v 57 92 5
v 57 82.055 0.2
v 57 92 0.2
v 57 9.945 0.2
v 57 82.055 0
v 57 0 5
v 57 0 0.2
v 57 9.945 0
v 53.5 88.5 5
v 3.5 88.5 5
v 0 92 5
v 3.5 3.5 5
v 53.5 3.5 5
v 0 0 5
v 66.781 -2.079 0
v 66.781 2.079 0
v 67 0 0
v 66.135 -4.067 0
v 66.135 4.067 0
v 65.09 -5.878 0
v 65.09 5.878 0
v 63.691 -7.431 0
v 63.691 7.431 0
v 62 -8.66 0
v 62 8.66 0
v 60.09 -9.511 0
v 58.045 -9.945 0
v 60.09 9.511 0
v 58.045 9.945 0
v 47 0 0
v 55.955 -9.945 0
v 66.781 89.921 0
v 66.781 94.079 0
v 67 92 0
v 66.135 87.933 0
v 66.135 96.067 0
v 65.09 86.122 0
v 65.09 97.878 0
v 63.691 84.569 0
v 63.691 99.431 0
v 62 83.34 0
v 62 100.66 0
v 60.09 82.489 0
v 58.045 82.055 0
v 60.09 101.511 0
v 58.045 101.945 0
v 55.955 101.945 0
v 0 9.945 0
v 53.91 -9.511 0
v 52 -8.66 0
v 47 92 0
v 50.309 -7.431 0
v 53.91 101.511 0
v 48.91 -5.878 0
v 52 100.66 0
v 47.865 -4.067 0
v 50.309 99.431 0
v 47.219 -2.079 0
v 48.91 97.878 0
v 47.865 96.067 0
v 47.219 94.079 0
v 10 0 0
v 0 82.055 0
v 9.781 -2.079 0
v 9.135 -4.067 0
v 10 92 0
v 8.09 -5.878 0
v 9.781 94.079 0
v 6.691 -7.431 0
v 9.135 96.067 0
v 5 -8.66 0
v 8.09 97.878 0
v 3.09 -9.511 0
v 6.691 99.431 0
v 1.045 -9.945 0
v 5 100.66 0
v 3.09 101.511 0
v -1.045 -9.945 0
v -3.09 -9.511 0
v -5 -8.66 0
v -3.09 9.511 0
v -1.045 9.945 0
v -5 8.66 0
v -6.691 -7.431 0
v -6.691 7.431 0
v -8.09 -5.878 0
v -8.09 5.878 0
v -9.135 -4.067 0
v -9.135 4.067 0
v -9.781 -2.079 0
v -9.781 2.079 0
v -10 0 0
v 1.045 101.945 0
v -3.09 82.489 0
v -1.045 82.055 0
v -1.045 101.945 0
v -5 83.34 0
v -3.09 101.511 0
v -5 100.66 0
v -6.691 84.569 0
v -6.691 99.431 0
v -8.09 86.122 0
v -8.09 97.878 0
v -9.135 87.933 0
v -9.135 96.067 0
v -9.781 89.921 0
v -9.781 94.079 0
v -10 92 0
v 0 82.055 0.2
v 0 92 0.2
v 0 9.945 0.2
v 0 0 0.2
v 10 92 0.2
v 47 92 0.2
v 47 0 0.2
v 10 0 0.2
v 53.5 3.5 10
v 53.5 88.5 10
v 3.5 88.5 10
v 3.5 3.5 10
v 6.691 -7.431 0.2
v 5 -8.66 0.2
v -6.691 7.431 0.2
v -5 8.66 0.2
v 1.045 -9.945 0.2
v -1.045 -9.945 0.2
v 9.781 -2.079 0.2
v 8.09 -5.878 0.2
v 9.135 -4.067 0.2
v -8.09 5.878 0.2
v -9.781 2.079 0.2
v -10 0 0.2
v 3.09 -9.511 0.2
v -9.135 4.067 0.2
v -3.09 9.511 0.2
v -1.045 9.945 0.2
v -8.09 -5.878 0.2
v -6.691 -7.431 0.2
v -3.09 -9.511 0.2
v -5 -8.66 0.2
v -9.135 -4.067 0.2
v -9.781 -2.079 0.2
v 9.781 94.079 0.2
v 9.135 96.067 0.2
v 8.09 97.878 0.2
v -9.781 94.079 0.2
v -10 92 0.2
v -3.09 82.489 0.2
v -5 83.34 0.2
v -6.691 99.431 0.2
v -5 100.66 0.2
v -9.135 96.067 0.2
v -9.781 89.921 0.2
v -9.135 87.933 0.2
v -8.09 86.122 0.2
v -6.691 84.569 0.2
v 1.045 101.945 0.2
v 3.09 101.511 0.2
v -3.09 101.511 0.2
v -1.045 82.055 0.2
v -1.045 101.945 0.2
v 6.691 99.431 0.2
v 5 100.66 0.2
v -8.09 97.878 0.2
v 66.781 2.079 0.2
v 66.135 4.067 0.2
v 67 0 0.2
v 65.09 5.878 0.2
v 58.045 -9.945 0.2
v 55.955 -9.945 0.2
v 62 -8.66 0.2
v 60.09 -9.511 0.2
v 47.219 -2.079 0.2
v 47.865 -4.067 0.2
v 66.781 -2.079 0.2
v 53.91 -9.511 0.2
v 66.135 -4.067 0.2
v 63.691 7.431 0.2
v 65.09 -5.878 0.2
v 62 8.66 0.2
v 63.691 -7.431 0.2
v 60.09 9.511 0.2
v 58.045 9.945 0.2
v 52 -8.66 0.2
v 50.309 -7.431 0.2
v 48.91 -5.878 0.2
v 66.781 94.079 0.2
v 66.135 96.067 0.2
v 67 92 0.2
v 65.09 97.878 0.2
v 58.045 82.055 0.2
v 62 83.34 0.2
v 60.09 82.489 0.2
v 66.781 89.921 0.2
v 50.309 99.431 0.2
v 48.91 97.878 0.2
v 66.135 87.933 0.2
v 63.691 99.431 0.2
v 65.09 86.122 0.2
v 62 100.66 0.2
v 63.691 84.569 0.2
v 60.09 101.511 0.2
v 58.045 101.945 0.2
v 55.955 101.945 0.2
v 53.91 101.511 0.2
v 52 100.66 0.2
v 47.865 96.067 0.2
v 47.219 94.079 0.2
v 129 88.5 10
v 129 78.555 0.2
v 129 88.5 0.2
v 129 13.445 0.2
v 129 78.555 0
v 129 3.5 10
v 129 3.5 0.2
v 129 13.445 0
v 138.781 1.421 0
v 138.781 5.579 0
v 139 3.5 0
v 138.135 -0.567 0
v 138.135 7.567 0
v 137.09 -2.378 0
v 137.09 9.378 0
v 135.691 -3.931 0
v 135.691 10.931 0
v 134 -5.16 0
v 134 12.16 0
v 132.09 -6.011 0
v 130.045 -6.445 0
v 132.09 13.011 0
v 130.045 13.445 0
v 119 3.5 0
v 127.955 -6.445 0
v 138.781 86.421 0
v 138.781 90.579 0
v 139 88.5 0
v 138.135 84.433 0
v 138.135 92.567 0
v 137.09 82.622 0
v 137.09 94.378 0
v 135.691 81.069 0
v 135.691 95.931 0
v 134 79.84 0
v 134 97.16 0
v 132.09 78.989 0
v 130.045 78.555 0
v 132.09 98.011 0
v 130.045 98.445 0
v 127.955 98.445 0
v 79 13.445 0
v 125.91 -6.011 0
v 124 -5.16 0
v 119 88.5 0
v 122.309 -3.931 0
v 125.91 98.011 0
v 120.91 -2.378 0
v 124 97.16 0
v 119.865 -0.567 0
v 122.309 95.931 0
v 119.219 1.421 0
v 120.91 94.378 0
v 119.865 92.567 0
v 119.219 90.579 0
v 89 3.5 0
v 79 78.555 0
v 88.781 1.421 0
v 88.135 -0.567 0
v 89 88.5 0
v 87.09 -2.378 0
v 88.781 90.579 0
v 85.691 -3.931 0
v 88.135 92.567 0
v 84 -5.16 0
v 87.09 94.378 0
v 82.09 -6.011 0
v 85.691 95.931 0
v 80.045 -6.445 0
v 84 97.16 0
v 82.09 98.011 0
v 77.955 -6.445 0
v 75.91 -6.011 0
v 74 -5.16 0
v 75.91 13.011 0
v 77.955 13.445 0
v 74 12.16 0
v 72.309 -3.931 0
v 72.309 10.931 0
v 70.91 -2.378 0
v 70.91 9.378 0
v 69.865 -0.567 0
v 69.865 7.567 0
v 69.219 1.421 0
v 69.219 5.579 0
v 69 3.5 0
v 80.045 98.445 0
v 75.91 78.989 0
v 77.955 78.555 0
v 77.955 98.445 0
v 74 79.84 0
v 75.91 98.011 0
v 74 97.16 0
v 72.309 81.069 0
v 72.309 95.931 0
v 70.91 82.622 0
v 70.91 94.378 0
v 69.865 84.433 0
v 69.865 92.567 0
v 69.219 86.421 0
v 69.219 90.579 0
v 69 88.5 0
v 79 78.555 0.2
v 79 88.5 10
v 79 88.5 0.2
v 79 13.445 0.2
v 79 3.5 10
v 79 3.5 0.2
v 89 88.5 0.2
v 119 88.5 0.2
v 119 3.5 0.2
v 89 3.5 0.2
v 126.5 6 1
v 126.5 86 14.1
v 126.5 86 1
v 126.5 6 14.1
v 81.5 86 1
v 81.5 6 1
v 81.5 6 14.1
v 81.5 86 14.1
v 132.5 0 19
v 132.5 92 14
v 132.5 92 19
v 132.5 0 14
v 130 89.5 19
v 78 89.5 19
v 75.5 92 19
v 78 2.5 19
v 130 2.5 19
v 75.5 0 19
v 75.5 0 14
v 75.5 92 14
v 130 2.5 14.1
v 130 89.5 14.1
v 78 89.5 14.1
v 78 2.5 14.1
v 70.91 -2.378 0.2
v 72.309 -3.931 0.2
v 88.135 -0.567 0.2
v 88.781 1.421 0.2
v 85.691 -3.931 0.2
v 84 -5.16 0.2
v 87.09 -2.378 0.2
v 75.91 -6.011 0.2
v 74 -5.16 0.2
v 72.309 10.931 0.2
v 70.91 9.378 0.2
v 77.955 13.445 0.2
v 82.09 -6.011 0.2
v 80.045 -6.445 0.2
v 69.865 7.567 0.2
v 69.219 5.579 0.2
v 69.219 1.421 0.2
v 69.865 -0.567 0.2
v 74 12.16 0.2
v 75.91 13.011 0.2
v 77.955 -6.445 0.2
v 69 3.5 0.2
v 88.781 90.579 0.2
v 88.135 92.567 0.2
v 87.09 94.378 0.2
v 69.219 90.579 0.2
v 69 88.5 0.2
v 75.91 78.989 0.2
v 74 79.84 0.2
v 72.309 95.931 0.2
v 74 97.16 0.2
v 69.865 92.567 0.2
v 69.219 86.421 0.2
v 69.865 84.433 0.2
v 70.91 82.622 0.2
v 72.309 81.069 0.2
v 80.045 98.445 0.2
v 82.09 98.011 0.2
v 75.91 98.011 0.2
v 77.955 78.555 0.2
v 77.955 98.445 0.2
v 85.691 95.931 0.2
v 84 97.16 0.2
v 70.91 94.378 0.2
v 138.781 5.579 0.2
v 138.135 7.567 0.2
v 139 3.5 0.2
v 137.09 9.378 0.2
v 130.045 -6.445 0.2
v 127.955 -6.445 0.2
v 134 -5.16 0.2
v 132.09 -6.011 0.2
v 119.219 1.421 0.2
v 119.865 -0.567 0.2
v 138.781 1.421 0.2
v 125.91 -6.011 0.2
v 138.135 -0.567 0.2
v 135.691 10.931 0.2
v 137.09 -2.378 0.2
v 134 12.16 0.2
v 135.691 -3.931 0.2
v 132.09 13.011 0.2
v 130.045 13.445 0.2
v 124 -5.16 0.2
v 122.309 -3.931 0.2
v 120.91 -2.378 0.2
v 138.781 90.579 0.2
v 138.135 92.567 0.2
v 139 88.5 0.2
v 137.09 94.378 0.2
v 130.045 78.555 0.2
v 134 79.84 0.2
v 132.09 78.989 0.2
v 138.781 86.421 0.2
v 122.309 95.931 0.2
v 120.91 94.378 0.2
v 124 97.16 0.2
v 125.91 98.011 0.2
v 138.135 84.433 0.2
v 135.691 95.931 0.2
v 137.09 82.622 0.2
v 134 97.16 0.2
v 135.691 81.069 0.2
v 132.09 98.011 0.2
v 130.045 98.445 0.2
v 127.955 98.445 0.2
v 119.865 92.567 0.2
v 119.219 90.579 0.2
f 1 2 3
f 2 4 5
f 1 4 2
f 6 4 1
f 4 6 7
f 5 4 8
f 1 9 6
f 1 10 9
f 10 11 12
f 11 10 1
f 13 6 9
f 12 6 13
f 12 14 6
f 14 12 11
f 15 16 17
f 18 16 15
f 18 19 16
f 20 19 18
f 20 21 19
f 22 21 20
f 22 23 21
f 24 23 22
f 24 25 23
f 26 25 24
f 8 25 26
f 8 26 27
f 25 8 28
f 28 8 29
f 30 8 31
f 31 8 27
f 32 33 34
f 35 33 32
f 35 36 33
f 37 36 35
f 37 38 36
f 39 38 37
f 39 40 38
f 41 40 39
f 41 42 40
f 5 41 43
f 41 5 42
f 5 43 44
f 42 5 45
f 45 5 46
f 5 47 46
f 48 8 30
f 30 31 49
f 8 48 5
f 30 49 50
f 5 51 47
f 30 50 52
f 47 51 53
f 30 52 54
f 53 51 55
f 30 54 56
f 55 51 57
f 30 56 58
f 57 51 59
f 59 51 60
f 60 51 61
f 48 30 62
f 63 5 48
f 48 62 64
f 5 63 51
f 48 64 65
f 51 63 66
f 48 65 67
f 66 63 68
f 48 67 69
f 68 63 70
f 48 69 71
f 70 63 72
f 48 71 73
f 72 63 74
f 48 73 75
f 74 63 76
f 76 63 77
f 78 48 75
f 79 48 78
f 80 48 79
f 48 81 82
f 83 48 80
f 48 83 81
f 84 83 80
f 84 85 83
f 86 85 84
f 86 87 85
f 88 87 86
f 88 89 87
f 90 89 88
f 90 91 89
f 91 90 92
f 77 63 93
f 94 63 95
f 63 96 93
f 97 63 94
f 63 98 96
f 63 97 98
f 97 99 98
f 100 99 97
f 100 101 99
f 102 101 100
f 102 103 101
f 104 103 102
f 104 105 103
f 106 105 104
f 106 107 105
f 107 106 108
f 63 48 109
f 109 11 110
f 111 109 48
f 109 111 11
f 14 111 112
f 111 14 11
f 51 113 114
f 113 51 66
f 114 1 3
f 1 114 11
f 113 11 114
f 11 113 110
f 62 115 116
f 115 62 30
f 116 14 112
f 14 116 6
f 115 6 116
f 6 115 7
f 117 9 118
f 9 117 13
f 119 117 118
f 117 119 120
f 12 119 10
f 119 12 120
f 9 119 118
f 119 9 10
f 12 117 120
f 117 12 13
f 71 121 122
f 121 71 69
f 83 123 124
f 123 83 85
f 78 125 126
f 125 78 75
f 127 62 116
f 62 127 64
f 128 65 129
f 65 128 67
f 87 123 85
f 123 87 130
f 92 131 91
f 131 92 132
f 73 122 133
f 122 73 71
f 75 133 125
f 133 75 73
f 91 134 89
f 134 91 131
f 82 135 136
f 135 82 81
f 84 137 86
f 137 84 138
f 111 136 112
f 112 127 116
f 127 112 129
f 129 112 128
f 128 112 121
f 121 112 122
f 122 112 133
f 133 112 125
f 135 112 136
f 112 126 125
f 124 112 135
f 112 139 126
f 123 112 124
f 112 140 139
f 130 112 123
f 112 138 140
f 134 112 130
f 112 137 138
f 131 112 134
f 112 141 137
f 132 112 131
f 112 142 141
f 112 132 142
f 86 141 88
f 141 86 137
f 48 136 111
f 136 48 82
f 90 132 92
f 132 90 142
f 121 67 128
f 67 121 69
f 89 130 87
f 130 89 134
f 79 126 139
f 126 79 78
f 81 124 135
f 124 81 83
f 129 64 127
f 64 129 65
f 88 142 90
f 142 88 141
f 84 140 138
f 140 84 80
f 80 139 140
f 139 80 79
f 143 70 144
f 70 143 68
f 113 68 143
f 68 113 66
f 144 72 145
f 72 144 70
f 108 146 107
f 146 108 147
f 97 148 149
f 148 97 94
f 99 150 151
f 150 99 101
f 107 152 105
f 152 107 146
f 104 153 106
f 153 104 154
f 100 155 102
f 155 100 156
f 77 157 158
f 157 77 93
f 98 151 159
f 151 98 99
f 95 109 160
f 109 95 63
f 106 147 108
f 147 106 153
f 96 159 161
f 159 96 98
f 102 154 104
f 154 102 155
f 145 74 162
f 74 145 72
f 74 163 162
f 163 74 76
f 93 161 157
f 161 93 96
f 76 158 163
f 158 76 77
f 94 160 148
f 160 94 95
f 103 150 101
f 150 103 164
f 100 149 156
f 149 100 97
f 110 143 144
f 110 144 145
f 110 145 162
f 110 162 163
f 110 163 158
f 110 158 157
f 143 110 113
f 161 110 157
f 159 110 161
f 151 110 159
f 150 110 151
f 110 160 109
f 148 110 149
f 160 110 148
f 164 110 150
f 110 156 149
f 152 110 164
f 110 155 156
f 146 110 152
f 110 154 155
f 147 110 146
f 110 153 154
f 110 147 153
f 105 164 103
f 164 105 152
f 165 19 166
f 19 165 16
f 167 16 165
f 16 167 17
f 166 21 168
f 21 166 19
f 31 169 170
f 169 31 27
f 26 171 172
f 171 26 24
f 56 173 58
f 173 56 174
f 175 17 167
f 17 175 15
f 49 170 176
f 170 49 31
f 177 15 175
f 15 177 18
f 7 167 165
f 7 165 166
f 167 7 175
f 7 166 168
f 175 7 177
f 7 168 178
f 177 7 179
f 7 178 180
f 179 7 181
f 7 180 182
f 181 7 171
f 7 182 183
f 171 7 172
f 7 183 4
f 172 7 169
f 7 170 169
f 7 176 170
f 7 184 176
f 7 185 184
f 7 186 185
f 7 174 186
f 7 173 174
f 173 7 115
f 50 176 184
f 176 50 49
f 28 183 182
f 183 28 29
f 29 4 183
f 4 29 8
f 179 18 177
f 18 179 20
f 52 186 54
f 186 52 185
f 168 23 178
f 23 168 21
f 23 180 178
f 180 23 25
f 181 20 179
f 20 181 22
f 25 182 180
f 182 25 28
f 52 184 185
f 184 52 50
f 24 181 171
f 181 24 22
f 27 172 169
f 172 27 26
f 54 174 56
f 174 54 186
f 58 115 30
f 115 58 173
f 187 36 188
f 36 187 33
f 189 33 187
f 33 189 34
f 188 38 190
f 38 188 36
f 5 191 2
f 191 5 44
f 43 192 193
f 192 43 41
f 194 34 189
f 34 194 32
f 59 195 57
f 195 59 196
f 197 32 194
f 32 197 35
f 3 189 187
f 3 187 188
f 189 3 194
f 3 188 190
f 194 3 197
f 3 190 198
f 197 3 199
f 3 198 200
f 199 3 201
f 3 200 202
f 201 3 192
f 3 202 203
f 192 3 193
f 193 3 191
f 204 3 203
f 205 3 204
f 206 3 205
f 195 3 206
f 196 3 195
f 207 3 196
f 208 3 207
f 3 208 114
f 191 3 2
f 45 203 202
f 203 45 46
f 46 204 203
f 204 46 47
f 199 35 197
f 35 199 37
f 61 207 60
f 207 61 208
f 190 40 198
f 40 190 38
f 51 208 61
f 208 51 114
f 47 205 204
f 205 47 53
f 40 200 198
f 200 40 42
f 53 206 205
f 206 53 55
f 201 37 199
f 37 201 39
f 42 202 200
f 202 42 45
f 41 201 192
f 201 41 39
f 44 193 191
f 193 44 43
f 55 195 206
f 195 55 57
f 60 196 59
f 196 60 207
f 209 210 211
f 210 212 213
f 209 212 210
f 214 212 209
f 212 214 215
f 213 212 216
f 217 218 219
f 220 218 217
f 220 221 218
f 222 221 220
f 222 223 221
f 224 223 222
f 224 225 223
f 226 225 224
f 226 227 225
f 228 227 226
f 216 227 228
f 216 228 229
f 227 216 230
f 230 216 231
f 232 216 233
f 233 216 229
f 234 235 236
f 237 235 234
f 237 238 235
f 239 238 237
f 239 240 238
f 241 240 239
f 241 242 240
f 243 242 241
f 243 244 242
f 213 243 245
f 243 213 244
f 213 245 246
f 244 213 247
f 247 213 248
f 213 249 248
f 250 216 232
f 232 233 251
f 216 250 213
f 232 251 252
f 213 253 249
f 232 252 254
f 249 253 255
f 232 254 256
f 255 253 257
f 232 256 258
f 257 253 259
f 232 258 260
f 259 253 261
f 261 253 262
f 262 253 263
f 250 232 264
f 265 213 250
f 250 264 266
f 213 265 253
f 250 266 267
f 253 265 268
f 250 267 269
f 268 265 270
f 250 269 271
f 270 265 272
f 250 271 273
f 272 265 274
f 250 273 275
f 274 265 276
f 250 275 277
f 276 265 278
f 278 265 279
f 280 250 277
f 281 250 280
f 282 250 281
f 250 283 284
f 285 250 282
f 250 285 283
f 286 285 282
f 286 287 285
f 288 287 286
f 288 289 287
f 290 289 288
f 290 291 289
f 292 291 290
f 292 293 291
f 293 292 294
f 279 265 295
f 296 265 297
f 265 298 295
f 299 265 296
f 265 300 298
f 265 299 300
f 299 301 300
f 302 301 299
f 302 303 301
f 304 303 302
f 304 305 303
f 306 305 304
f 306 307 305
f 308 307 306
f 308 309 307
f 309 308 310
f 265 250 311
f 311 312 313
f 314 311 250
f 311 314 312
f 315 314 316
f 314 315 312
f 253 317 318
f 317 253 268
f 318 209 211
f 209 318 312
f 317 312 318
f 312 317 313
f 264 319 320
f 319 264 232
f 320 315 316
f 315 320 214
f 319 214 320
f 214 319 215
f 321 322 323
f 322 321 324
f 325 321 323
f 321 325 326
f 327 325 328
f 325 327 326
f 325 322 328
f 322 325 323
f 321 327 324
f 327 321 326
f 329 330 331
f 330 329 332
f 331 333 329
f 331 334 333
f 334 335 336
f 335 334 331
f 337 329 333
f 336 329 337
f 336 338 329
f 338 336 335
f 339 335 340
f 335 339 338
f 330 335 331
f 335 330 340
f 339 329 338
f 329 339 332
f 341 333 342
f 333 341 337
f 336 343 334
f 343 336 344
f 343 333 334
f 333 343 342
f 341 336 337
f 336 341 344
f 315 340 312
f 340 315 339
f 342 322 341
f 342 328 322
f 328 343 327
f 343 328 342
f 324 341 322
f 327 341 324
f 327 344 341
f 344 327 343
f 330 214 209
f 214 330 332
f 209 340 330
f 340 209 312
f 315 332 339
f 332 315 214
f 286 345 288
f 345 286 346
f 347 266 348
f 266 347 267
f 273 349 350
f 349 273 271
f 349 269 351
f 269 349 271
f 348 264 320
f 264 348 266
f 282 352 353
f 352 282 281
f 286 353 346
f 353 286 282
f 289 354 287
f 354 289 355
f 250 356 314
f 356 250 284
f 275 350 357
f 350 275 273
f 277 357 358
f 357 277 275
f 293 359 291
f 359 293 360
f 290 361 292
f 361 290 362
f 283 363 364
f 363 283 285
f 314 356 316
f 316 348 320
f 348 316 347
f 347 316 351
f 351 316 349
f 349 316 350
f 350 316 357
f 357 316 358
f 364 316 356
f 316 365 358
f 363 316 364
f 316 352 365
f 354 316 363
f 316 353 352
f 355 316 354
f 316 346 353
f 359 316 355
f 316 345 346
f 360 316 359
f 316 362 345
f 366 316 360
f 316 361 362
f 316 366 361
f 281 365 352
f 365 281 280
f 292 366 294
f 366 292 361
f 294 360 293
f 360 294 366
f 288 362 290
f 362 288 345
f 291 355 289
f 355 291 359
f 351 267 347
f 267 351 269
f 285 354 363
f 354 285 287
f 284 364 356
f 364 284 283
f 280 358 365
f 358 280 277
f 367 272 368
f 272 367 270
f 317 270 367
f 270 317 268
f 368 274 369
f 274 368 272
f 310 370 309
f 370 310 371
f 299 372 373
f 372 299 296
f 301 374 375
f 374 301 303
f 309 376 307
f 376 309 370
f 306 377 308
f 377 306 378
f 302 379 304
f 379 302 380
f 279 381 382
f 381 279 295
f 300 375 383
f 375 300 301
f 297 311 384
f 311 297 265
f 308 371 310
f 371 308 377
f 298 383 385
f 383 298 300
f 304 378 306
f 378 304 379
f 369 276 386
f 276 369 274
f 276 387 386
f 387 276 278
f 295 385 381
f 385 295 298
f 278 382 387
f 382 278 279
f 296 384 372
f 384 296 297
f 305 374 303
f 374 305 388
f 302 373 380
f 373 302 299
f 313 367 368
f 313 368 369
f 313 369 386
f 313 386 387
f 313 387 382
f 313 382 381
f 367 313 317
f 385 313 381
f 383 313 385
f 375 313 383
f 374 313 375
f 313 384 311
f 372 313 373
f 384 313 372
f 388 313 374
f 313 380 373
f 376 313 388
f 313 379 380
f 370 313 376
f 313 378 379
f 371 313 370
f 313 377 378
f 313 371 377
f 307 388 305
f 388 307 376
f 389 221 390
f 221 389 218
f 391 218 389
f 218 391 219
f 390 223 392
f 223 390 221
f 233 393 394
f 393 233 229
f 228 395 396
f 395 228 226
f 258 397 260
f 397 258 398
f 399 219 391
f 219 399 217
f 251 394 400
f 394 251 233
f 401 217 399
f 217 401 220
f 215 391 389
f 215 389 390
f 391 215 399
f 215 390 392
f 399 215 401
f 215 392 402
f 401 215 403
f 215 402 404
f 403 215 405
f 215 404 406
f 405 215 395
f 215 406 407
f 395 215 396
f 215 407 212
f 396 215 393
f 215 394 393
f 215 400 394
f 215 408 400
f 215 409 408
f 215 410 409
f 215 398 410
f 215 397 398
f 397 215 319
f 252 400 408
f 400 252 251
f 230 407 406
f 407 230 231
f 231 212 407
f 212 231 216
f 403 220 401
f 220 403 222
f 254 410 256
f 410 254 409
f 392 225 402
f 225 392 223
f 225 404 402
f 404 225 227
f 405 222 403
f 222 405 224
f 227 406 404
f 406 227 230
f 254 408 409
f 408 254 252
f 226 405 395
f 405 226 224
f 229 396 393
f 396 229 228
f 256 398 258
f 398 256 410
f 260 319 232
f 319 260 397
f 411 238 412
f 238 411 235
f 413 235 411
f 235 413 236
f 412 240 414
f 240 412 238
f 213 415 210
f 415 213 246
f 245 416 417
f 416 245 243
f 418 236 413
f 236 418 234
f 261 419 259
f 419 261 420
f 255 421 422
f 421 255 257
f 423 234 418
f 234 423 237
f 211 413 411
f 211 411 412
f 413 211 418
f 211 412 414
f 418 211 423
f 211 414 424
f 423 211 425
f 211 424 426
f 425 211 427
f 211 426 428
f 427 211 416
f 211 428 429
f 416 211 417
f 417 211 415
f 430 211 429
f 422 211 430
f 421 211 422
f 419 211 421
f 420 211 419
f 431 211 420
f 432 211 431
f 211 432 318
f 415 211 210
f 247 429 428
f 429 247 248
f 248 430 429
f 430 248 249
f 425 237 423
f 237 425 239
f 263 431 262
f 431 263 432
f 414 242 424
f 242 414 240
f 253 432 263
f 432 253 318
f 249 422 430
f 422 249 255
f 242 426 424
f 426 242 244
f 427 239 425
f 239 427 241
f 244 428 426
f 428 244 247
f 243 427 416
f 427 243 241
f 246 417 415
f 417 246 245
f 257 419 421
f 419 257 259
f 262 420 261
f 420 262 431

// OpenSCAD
// [FL_INDEX: keywords="openscad, 3d_parametric, Customizable_Stackable_Box, csg_solid" | COT="Parametric OpenSCAD design from 3DCodeverse"]
// Title: Customizable Stackable Box

// Display the Cover
display_cover = "yes"; // [yes,no]
// Display the box
display_box = "yes"; // [yes,no]
// Create ears at the corner
with_antiwarp_ears = "yes"; // [yes,no]


// the x length inside the box (the resulting x of the box is inner_x + 2*wall)
inner_x = 45;
// the y length inside the box
inner_y = 80;
// the z height inside the box, until the stacking frame begins
inner_z = 13;

// the z height of the stacking frame
stack_z = 5;
// per side gap between the box-bottom and the stacking frame (box bttom = inner_x + 2*wall; inner stackingframe x = inner_x + 2*wall + 2*stack_gap)
stack_gap = 1;

// wall thickness
wall = 2.5;
// bottom thickness
bottom = 1;

// start-height for overhang suport (should be >stack_z )
support_start_height = 10;

// height of the cover (the stacking part has the "stack_z"-height)
cover_height = 5;

// radius of the antiwarp ear
ear_radius = 10;
// height of the antiwarp ear, should be your layer-height for easy cutoff
ear_height = 0.2;


if(display_cover == "yes"){
	stackable_box_cover(inner_x,inner_y,stack_z,stack_gap,wall,cover_height);
	if(with_antiwarp_ears == "yes"){
		ears(0, 0, inner_x + wall*4 + stack_gap*2, inner_y + wall*4 + stack_gap*2);
	}
}


if(display_box == "yes"){
translate([inner_x + wall*4 + stack_gap*2 + ear_radius*2 + 2,wall + stack_gap,0]){
	stackable_box(inner_x,inner_y,inner_z,stack_z,stack_gap,wall,bottom,support_start_height);
	if(with_antiwarp_ears == "yes"){
		difference() {
			ears(0, 0, inner_x + wall*2, inner_y + wall*2);
			translate([wall,wall, 0]) 
				cube([inner_x, inner_y, inner_z*2]);
		}
	}
}
}


module stackable_box_cover(x, y,stack_z, gap, w,c) {
	cube([x + w*4 + gap*2, y + w*4 + gap*2, c]);
	translate([w+gap, w+gap, 0])
		cube([x + w*2, y + w*2, stack_z+c]);


}


module stackable_box(x, y, z,stack_z, gap, w, b, supheight) {
	box(x, y, z, w, b);
	translate([-wall-gap, -wall-gap, z+b])
		box(x + wall*2 + gap*2, y + wall*2 + gap*2, stack_z, w, 0);

	difference() {
		hull() {
			translate([-wall-gap, -wall-gap, z+b]) 
				box(x + wall*2 + gap*2, y + wall*2 + gap*2, 0.1, w, 0);
			translate([0, 0, supheight]) 
				box(x, y, 0.1, w, b);
		}
		translate([w,w, 0]) 
			cube([x, y, z*2]);
	}


}

module box(x, y, z, w,b) {
	difference() {
		cube([(x + (2 * w)), (y + (2 * w)), (z + b)]);
		translate([w, w, b]) 
			cube([x, y, (z * 2)]);
	}
}

module ears(xmin, ymin, xmax, ymax) {
	translate([xmin, ymin, 0]) cylinder(r = ear_radius, h = ear_height);
	translate([xmin, ymax, 0]) cylinder(r = ear_radius, h = ear_height);
	translate([xmax, ymin, 0]) cylinder(r = ear_radius, h = ear_height);
	translate([xmax, ymax, 0]) cylinder(r = ear_radius, h = ear_height);
}
